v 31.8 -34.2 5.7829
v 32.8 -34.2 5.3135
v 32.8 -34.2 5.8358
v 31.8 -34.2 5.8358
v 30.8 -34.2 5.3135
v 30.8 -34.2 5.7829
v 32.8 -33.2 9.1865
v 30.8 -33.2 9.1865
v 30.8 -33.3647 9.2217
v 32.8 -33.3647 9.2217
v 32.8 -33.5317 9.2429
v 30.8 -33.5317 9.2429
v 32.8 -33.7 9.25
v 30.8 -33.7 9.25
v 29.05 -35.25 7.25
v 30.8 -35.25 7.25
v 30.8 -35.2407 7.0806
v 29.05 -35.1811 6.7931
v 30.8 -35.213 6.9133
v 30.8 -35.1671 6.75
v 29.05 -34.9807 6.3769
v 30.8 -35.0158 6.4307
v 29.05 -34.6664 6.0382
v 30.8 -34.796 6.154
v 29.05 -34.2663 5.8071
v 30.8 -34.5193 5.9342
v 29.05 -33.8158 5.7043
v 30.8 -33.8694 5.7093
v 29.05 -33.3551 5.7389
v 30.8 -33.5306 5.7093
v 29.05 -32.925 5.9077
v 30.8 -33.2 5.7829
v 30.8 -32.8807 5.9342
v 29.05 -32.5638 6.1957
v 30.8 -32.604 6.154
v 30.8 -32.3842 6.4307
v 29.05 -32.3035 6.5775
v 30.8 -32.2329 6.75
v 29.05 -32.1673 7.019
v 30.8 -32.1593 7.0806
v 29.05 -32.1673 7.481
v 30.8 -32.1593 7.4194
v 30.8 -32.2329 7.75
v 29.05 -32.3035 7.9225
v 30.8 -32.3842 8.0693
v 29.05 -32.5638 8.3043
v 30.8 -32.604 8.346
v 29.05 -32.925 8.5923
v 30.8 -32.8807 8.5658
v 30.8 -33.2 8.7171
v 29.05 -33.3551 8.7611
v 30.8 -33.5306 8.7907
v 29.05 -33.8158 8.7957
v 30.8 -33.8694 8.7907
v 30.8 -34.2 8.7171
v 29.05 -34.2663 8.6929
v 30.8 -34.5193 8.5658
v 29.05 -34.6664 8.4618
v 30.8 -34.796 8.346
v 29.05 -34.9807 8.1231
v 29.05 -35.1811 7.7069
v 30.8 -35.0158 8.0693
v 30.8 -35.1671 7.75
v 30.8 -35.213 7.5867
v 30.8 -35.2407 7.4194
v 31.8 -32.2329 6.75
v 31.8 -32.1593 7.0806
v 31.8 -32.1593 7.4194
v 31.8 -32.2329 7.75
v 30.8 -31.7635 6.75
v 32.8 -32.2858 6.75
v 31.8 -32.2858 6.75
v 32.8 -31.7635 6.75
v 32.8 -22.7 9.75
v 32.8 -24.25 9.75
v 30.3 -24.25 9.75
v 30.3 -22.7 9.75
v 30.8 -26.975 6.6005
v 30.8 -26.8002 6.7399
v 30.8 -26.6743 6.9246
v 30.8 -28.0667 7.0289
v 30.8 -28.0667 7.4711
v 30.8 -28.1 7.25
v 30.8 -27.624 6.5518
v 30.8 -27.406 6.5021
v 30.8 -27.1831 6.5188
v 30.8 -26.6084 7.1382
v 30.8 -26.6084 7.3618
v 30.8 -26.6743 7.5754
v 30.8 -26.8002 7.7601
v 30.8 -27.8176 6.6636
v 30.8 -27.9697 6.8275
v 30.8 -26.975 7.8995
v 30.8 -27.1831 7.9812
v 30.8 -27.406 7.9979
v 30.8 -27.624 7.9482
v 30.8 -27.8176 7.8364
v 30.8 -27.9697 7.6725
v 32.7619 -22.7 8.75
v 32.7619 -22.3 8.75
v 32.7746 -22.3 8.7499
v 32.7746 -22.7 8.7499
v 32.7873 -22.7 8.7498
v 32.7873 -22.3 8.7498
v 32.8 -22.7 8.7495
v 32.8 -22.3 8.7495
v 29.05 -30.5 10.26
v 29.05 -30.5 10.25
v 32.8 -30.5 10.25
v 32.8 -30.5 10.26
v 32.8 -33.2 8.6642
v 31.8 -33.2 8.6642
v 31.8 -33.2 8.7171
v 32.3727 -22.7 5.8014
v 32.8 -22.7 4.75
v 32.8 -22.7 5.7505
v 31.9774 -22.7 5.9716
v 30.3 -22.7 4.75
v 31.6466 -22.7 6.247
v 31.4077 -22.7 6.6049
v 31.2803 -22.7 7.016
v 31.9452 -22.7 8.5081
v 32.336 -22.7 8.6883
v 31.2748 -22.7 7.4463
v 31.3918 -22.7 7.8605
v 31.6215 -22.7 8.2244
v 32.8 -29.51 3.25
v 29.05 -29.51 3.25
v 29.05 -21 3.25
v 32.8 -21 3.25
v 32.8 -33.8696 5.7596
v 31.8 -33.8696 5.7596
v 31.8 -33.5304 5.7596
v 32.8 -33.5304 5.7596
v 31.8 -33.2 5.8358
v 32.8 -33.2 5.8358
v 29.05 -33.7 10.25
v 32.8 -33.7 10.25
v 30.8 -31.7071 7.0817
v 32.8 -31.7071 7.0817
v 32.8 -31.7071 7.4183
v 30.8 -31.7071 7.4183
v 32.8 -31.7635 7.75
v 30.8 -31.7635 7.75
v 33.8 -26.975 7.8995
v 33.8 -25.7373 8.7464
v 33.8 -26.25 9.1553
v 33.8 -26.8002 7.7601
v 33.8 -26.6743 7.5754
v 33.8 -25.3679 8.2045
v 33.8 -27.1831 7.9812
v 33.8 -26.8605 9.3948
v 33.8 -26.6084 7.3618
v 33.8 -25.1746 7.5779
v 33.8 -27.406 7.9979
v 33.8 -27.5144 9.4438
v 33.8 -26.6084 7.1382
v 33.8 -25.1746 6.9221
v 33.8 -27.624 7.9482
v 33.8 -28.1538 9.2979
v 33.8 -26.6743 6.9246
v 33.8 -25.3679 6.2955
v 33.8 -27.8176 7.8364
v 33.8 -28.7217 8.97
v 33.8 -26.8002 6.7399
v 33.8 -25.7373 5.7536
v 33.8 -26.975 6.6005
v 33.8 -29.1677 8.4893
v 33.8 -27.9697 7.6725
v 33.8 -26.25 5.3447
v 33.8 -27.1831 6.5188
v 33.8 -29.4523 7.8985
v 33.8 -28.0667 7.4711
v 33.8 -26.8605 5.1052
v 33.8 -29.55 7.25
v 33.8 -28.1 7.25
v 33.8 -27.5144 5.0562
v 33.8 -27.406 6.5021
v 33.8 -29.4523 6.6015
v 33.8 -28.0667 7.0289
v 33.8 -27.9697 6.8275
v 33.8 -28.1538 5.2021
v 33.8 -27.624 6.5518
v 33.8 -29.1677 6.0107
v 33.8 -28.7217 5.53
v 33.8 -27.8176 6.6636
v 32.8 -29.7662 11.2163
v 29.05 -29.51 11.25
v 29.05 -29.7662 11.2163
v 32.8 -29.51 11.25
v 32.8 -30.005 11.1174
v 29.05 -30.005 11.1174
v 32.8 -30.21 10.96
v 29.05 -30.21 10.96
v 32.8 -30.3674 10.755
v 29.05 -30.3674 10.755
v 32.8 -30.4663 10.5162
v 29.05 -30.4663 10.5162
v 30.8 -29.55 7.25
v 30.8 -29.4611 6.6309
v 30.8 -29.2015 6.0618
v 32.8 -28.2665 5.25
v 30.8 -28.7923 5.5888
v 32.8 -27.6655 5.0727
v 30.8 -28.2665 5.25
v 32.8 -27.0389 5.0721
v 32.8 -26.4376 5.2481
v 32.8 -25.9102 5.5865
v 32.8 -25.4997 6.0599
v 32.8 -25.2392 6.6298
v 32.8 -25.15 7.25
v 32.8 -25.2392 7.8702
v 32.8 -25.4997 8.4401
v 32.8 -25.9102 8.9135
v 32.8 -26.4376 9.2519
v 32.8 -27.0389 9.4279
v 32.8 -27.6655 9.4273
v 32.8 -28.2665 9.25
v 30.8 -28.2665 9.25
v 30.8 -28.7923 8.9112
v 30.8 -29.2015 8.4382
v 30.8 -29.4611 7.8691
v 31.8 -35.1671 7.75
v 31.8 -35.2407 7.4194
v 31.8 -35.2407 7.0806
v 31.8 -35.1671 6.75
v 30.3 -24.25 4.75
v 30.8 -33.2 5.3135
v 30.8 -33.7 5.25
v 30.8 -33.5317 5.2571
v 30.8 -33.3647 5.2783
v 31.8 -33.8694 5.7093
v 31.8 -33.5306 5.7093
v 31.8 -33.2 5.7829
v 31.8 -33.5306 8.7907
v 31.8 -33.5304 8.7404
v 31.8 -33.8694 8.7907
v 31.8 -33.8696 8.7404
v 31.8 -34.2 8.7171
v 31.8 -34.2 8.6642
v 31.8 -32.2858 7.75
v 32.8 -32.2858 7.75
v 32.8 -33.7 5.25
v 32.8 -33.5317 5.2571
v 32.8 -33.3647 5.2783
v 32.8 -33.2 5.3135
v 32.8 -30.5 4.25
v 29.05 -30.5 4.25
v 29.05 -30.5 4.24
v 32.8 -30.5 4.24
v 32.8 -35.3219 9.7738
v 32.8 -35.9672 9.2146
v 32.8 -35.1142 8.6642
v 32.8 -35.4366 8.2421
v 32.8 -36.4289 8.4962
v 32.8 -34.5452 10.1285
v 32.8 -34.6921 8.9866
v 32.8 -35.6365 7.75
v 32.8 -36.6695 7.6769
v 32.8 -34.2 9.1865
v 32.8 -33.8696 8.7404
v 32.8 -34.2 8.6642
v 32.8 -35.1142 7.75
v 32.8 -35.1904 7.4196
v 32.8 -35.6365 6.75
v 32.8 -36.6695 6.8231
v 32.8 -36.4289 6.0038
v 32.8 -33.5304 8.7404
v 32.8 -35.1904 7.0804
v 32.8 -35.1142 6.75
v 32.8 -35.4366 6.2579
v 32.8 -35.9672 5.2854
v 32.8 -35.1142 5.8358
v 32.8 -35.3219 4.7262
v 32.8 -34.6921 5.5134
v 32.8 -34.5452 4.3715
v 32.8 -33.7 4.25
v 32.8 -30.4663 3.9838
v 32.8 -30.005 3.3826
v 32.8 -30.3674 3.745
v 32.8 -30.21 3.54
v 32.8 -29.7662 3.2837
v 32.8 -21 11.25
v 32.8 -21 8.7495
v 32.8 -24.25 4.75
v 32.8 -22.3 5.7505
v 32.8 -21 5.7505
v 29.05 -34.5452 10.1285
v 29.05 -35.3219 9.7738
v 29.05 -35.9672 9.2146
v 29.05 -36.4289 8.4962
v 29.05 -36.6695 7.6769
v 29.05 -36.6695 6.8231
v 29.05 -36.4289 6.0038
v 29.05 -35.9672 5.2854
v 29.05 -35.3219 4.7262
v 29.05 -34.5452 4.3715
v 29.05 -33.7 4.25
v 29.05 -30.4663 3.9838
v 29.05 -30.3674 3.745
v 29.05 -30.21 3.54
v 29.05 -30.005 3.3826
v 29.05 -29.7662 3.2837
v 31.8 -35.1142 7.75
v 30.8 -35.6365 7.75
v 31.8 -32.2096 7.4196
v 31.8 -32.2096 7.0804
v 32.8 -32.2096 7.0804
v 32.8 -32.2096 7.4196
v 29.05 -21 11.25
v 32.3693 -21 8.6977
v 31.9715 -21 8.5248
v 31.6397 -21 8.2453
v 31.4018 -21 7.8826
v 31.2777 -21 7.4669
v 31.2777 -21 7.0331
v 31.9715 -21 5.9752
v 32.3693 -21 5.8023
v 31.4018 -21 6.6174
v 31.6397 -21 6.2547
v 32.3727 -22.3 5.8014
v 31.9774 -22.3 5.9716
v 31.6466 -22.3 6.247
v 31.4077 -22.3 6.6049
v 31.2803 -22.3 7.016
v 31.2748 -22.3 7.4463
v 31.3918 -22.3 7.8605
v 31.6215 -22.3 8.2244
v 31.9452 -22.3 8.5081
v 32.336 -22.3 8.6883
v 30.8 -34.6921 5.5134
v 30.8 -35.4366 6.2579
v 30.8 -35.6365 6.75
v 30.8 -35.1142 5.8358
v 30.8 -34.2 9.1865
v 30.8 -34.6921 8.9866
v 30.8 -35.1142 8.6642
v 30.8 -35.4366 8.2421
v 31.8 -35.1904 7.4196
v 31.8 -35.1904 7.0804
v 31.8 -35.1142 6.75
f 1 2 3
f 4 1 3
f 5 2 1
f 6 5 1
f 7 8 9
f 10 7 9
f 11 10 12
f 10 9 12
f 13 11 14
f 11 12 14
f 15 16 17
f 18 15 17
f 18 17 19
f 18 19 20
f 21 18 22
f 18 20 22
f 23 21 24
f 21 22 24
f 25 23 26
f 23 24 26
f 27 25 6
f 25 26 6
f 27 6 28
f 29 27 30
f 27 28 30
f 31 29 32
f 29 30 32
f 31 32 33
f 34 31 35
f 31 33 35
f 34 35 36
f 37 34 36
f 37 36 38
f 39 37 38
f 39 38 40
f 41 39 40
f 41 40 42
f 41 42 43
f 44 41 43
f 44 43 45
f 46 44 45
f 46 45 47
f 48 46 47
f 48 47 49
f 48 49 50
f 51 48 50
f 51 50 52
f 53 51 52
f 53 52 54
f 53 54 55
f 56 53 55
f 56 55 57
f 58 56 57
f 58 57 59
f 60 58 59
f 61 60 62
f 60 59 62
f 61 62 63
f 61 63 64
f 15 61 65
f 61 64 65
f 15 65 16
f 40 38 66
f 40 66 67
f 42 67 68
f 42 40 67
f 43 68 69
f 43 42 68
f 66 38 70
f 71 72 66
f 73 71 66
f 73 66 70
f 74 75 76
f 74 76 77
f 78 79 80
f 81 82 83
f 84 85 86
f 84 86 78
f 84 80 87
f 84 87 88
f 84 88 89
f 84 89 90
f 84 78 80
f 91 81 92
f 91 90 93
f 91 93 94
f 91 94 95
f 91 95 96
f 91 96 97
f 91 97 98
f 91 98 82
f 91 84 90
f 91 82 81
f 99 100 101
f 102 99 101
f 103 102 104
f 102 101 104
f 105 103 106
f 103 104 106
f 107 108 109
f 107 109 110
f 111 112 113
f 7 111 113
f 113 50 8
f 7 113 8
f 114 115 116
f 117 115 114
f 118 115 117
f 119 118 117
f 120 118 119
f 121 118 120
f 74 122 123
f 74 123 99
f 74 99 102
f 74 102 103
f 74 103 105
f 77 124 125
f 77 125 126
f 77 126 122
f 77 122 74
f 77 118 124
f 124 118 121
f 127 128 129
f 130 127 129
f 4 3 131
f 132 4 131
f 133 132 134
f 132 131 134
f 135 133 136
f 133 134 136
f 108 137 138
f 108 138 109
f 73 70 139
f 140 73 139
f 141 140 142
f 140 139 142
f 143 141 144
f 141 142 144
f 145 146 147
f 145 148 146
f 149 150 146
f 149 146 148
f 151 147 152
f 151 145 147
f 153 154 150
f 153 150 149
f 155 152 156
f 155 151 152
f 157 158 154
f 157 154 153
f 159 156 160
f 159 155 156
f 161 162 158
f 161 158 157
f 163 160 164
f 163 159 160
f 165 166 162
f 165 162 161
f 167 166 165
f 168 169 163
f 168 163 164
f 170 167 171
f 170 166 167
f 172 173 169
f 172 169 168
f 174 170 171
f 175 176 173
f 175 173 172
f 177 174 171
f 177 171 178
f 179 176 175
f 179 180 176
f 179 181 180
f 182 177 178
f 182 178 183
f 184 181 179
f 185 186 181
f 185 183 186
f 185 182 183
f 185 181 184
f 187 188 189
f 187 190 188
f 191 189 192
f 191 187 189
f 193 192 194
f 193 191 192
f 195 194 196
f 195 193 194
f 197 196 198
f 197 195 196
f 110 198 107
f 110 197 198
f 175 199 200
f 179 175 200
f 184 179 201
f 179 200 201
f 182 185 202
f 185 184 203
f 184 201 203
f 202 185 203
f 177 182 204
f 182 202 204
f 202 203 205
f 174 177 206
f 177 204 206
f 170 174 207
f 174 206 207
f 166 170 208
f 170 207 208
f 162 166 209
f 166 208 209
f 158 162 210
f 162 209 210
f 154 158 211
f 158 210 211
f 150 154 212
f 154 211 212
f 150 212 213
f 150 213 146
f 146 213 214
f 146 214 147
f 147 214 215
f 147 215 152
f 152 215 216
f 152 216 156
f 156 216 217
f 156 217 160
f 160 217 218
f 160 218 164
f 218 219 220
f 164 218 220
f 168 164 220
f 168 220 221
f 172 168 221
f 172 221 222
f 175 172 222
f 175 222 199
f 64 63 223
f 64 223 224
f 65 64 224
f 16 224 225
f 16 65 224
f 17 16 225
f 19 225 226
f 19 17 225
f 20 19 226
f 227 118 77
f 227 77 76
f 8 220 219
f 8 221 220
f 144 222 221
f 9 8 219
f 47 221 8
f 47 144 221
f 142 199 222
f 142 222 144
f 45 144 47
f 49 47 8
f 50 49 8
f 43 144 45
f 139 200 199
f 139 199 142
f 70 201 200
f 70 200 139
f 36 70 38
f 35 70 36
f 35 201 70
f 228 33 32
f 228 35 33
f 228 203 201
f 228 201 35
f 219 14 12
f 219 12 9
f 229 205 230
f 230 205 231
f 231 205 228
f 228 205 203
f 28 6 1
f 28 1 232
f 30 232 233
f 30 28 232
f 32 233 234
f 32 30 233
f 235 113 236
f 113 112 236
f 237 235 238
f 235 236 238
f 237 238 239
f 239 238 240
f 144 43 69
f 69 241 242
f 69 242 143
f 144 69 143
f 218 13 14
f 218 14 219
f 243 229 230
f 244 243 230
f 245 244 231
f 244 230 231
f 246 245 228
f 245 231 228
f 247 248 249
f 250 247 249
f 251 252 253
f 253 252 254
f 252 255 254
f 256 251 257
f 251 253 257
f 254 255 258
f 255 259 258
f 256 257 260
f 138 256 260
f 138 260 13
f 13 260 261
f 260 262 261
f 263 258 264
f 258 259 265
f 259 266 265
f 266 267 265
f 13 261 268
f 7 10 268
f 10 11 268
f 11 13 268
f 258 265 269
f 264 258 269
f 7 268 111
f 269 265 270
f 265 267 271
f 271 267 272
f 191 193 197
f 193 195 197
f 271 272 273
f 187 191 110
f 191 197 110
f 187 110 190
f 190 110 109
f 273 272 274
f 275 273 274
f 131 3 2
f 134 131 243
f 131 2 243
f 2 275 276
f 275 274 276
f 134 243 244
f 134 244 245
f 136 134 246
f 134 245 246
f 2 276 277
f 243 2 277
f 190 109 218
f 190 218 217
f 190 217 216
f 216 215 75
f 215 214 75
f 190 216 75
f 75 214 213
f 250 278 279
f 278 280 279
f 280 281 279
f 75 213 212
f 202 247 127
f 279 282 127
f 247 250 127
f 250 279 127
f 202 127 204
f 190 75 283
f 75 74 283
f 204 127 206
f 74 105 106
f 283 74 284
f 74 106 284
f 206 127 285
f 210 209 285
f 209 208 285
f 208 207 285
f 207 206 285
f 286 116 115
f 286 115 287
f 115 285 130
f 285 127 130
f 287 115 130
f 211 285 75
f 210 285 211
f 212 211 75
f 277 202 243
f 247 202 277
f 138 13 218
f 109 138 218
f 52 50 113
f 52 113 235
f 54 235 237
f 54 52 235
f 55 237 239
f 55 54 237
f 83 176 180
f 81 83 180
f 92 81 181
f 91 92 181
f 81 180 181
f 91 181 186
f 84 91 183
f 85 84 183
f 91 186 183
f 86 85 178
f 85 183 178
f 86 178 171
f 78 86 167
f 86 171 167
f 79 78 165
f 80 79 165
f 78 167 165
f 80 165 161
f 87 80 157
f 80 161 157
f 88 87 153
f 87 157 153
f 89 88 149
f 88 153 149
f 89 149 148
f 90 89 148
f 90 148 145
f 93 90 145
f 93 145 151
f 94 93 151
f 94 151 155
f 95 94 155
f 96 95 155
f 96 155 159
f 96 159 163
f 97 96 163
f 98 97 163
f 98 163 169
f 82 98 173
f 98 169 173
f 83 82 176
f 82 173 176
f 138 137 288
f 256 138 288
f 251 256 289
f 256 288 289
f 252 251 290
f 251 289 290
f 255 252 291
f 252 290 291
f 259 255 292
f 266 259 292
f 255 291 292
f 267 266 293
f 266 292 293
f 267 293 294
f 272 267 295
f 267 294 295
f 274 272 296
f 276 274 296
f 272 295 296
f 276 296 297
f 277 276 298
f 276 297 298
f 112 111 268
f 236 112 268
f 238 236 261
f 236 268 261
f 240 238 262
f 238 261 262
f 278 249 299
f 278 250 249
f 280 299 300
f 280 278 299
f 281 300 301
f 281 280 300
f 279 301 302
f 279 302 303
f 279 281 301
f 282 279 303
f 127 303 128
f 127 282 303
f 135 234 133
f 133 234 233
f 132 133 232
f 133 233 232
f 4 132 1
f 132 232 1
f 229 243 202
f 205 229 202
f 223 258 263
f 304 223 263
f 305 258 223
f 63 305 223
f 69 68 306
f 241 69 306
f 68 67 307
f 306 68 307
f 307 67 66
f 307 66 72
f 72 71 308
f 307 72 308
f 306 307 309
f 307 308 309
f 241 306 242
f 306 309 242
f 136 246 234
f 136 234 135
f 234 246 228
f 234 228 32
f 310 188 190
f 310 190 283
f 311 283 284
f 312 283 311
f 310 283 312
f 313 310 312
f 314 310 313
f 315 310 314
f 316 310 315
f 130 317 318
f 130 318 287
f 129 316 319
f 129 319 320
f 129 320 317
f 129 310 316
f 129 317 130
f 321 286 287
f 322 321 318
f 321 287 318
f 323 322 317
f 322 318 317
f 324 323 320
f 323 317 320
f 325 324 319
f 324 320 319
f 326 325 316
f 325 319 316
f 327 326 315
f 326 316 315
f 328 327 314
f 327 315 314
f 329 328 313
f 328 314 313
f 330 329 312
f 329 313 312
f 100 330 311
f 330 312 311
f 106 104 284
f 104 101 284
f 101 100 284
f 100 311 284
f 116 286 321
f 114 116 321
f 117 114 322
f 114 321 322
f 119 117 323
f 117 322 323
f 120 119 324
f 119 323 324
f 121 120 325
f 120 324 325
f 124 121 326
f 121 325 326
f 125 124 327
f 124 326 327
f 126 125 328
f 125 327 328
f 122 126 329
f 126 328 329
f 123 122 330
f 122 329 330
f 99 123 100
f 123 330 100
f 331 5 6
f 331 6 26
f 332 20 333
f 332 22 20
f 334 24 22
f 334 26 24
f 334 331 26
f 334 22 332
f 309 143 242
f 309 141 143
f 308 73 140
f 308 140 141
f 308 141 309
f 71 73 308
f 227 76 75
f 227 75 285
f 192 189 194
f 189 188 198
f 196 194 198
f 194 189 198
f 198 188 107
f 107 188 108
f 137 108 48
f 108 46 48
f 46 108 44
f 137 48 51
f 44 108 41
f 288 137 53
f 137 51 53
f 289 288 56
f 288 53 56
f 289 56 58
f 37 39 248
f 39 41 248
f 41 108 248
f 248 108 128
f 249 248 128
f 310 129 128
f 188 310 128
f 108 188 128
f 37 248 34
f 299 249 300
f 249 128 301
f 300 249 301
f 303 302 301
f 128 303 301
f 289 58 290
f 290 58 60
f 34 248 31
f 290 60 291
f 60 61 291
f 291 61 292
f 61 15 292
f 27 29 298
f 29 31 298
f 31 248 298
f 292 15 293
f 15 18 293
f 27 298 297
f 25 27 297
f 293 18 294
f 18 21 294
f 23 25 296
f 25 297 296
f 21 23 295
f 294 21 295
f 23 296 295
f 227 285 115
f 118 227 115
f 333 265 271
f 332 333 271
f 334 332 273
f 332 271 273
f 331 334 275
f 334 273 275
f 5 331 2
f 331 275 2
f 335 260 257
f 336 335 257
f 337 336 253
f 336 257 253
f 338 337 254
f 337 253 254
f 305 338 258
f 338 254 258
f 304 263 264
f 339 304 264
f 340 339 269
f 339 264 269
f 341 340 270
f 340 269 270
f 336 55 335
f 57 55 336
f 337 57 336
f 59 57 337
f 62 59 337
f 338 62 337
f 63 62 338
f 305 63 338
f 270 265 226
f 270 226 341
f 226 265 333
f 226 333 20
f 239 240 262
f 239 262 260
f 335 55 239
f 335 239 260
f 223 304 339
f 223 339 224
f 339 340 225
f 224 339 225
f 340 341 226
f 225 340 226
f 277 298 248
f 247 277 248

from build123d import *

# Parameters (mm, degrees)
PAD031_DEPTH            = 3.75
SKETCH061_R             = 1.5
POCKET029_DEPTH         = 3.75
POCKET035_DEPTH         = 2
SKETCH063_R             = 1.5
POCKET036_DEPTH         = 1.3
SKETCH064_R             = 2.2
PAD037_DEPTH            = 3
SKETCH065_W             = 2.8
SKETCH065_H             = 4
PAD038_DEPTH            = 2
SKETCH066_R             = 0.75
POCKET037_DEPTH         = 3
FILLET022_R             = 0.99
SKETCH073_W             = 2.2
SKETCH073_H             = 5
POCKET040_DEPTH         = 0.5
PAD197_DEPTH            = 0.4
PAD197_FACE23_W         = 5
PAD197_FACE23_H         = 2.5
PAD198_DEPTH            = 0.25
SKETCH338_R             = 1.55
SKETCH338_R_2           = 1.5
POCKET161_DEPTH         = 5
PAD201_DEPTH            = 2
PAD202_DEPTH            = 1
BODY006_ROLL_ANGLE      = -90
BODY006_PLACEMENT_ANGLE = -90


with BuildPart() as part:
    # Sketch060 → Pad031 (new body)
    with BuildSketch(Plane(origin=(-1, 0, -1.2), x_dir=(1, 0, 0), z_dir=(0, 0, 1))):
        with BuildLine():
            ThreePointArc((0, -3), (3, 0), (0, 3))
            Line((0, 3), (-3.2, 3))
            Line((-3.2, 3), (-3.2, 4))
            Line((-3.2, 4), (-12.7, 4))
            Line((-12.7, -4), (-12.7, 4))
            Line((-3.2, -4), (-12.7, -4))
            Line((-3.2, -3), (-3.2, -4))
            Line((0, -3), (-3.2, -3))
        make_face()
    extrude(amount=PAD031_DEPTH)

    # Sketch061 (on Face10 of Pad031) → Pocket029 (cut)
    with BuildSketch(Plane.XY.offset(2.55)):
        with Locations((-1, 0)):
            Circle(SKETCH061_R)
    extrude(amount=-POCKET029_DEPTH, mode=Mode.SUBTRACT)

    # Sketch062 (on DatumPlane) → Pocket035 (cut)
    with BuildSketch(Plane.XY.offset(2.55)):
        with BuildLine():
            ThreePointArc((-1, -2), (1, 0), (-1, 2))
            Line((-1, 2), (-10.2, 2))
            Line((-10.2, 2), (-10.2, 2.5))
            Line((-10.2, 2.5), (-12.4, 2.5))
            Line((-12.4, -2.5), (-12.4, 2.5))
            Line((-10.2, -2.5), (-12.4, -2.5))
            Line((-10.2, -2), (-10.2, -2.5))
            Line((-1, -2), (-10.2, -2))
        make_face()
    extrude(amount=-POCKET035_DEPTH, mode=Mode.SUBTRACT)

    # Sketch063 (on DatumPlane) → Pocket036 (cut)
    with BuildSketch(Plane(origin=(-13.7, 0, 0), x_dir=(0, -1, 0), z_dir=(-1, 0, 0))):
        with Locations((0, 2.511938)):
            Circle(SKETCH063_R)
    extrude(amount=-POCKET036_DEPTH, mode=Mode.SUBTRACT)

    # Sketch064 (on DatumPlane) → Pad037 (join)
    with BuildSketch(Plane.XY.offset(0.55)):
        with Locations((-7.35, 0)):
            Circle(SKETCH064_R)
    extrude(amount=PAD037_DEPTH)

    # Sketch065 (on DatumPlane) → Pad038 (join)
    with BuildSketch(Plane.XY.offset(0.55)):
        with Locations((-8.8, 0)):
            Rectangle(SKETCH065_W, SKETCH065_H)
    extrude(amount=PAD038_DEPTH)

    # Sketch066 (on DatumPlane) → Pocket037 (cut)
    with BuildSketch(Plane.XY.offset(3.55)):
        with Locations((-7.35, 0)):
            Circle(SKETCH066_R)
    extrude(amount=-POCKET037_DEPTH, mode=Mode.SUBTRACT)

    # Fillet022
    fillet022_edges = [part.edges().sort_by_distance(p)[0] for p in [
        (-4.2, 4, 0.675),
        (-4.2, -4, 0.675),
    ]]
    fillet(fillet022_edges, radius=FILLET022_R)

    # Sketch073 (on DatumPlane) → Pocket040 (cut)
    with BuildSketch(Plane.XY.offset(0.55)):
        with Locations((-11.3, 0)):
            Rectangle(SKETCH073_W, SKETCH073_H)
    extrude(amount=-POCKET040_DEPTH, mode=Mode.SUBTRACT)

    # Pocket040 Face23 → Pad197 (add)
    with BuildSketch(Plane(origin=(-12.4, 0, 1.054406), x_dir=(0, -1, 0), z_dir=(1, 0, 0))):
        with BuildLine():
            Line((1.499517, -1.495594), (2.5, -1.495594))
            Line((2.5, -1.495594), (2.5, 1.004406))
            Line((2.5, 1.004406), (-2.5, 1.004406))
            Line((-2.5, 1.004406), (-2.5, -1.495594))
            Line((-2.5, -1.495594), (-1.499517, -1.495594))
            ThreePointArc((-1.499517, -1.495594), (-0.019033, 0.042347), (1.5, -1.457532))
            ThreePointArc((1.5, -1.457532), (1.499879, -1.476565), (1.499517, -1.495594))
        make_face()
    extrude(amount=PAD197_DEPTH)

    # Pad197 Face23 → Pad198 (add)
    with BuildSketch(Plane(origin=(-10.2, 0, 1.3), x_dir=(0, 1, 0), z_dir=(-1, 0, 0))):
        Rectangle(PAD197_FACE23_W, PAD197_FACE23_H)
    extrude(amount=PAD198_DEPTH)

    # Sketch338 (on Face18 of Pad198) → Pocket161 (cut)
    with BuildSketch(Plane.XY.offset(0.55)):
        with Locations((-1, 0)):
            Circle(SKETCH338_R)
        with Locations((-1, 0)):
            Circle(SKETCH338_R_2, mode=Mode.SUBTRACT)
    extrude(amount=-POCKET161_DEPTH, mode=Mode.SUBTRACT)

    # Sketch339 (on Face23 of Pocket161) → Pad201 (join)
    with BuildSketch(Plane.XY.offset(0.55)):
        with BuildLine():
            ThreePointArc((-0.5, 1.46714), (-1, 1.55), (-1.5, 1.46714))
            Line((-1.5, 1.936492), (-1.5, 1.46714))
            ThreePointArc((-0.5, 1.936492), (-1, 2), (-1.5, 1.936492))
            Line((-0.5, 1.936492), (-0.5, 1.46714))
        make_face()
        with BuildLine():
            ThreePointArc((-1.5, -1.46714), (-1, -1.55), (-0.5, -1.46714))
            Line((-0.5, -1.46714), (-0.5, -1.936492))
            ThreePointArc((-1.5, -1.936492), (-1, -2), (-0.5, -1.936492))
            Line((-1.5, -1.46714), (-1.5, -1.936492))
        make_face()
        with BuildLine():
            ThreePointArc((-2.46714, 0.5), (-2.55, 0), (-2.46714, -0.5))
            Line((-2.46714, -0.5), (-2.936492, -0.5))
            ThreePointArc((-2.936492, 0.5), (-3, 0), (-2.936492, -0.5))
            Line((-2.46714, 0.5), (-2.936492, 0.5))
        make_face()
        with BuildLine():
            ThreePointArc((0.46714, -0.5), (0.55, 0), (0.46714, 0.5))
            Line((0.936492, 0.5), (0.46714, 0.5))
            ThreePointArc((0.936492, -0.5), (1, 0), (0.936492, 0.5))
            Line((0.936492, -0.5), (0.46714, -0.5))
        make_face()
    extrude(amount=PAD201_DEPTH)

    # Sketch340 (on Face31 of Pad201) → Pad202 (join)
    with BuildSketch(Plane.XY.offset(2.55)):
        with BuildLine():
            ThreePointArc((-2.46714, 0.5), (-2.55, 0), (-2.46714, -0.5))
            Line((-2.414214, -0.5), (-2.46714, -0.5))
            ThreePointArc((-2.414214, 0.5), (-2.5, 0), (-2.414214, -0.5))
            Line((-2.414214, 0.5), (-2.46714, 0.5))
        make_face()
        with BuildLine():
            ThreePointArc((-1.5, -1.46714), (-1, -1.55), (-0.5, -1.46714))
            Line((-0.5, -1.46714), (-0.5, -1.414214))
            ThreePointArc((-1.5, -1.414214), (-1, -1.5), (-0.5, -1.414214))
            Line((-1.5, -1.46714), (-1.5, -1.414214))
        make_face()
        with BuildLine():
            ThreePointArc((-0.5, 1.46714), (-1, 1.55), (-1.5, 1.46714))
            Line((-1.5, 1.46714), (-1.5, 1.414214))
            ThreePointArc((-0.5, 1.414214), (-1, 1.5), (-1.5, 1.414214))
            Line((-0.5, 1.46714), (-0.5, 1.414214))
        make_face()
        with BuildLine():
            ThreePointArc((0.46714, -0.5), (0.55, 0), (0.46714, 0.5))
            Line((0.414214, 0.5), (0.46714, 0.5))
            ThreePointArc((0.414214, -0.5), (0.5, 0), (0.414214, 0.5))
            Line((0.46714, -0.5), (0.414214, -0.5))
        make_face()
    extrude(amount=-PAD202_DEPTH)


with BuildPart() as part_1:
    # Body006 roll: moved
    add(part.part.rotate(Axis((0, 0, 0), (1, 0, 0)), BODY006_ROLL_ANGLE))


with BuildPart() as part_2:
    # Body006 placement: moved
    add(part_1.part.moved(Location((30.25, -34.7, 7.25))).rotate(Axis((30.25, -34.7, 7.25), (0, 0, 1)), BODY006_PLACEMENT_ANGLE))


solid = part_2.part
